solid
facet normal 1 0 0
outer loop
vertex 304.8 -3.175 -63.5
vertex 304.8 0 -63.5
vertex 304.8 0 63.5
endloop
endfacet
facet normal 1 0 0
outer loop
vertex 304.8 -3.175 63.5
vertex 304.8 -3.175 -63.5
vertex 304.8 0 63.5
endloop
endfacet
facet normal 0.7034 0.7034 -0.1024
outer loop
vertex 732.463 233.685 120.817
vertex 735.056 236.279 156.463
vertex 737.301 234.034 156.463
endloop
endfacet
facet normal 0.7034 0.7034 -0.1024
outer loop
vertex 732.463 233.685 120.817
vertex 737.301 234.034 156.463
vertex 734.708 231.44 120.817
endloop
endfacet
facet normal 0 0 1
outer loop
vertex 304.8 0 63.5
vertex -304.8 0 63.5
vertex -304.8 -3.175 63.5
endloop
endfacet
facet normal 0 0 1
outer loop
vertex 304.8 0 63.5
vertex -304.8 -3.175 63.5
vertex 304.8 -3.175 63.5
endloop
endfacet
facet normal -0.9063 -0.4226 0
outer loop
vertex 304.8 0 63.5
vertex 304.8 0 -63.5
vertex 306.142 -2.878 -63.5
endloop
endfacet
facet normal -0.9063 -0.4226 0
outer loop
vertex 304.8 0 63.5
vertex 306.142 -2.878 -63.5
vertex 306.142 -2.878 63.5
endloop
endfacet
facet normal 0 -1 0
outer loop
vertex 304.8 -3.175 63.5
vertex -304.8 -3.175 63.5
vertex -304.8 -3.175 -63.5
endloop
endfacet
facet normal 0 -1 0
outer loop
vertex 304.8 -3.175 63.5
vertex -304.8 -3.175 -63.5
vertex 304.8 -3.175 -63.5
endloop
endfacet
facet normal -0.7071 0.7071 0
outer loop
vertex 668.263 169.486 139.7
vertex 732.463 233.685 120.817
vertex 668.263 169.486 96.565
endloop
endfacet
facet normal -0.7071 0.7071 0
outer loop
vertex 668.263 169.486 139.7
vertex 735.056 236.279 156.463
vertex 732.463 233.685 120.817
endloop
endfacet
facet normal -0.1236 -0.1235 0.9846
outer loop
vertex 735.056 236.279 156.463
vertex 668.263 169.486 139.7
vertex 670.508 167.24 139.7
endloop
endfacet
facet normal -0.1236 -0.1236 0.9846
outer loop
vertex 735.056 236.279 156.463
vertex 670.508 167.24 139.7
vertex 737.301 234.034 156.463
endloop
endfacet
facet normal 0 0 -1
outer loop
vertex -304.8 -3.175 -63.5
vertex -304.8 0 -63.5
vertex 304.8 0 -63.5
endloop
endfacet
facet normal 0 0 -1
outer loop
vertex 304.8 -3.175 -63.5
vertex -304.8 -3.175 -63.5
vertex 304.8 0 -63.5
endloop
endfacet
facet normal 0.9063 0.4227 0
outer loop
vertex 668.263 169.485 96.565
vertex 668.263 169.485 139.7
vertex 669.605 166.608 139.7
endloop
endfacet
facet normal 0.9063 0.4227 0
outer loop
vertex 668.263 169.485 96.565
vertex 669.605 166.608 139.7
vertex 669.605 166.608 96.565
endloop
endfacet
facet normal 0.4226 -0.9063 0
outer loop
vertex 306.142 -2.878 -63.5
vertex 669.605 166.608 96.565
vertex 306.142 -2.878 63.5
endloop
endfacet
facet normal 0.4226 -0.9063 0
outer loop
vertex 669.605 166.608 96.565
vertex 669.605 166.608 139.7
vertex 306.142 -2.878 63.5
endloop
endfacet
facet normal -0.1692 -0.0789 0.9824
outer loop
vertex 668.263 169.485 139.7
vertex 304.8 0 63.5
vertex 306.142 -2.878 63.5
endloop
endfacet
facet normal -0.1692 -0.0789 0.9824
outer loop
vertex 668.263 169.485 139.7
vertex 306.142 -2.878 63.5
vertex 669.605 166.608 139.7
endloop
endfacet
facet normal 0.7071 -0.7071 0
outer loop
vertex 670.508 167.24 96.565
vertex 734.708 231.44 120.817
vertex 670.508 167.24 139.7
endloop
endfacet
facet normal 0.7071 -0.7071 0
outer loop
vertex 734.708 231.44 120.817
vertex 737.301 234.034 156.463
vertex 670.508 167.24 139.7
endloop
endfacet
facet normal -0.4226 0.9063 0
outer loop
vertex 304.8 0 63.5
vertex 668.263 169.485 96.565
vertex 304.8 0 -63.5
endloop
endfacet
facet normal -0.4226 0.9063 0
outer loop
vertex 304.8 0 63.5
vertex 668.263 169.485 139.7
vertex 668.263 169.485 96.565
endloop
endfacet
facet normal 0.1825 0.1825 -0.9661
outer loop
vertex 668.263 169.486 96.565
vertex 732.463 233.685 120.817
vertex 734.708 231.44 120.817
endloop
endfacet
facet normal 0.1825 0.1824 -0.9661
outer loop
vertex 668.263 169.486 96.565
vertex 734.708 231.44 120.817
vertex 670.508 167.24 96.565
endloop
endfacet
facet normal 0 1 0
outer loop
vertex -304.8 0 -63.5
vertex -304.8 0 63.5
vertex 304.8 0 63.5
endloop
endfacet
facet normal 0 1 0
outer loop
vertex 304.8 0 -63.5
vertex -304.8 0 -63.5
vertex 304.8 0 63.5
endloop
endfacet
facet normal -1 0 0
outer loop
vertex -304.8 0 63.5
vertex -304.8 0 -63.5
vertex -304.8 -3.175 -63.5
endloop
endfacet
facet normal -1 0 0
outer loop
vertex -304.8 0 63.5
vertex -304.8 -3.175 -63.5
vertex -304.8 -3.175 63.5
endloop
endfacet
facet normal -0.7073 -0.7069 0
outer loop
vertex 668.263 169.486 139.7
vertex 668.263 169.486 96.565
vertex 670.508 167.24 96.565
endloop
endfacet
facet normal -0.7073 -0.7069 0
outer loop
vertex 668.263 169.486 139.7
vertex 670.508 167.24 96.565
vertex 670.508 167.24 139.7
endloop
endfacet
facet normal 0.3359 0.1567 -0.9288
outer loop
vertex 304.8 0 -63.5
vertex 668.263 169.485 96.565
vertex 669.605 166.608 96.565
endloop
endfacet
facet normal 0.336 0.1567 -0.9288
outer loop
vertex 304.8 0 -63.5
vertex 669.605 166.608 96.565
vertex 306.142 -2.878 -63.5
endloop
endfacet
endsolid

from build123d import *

# Parameters (mm, degrees)
F0_W     = 609.6
F0_H     = 127
F1_DEPTH = 3.175
F4_DEPTH = 3.175
F7_DEPTH = 3.175


with BuildPart() as f1:
    # F0 (on Front) → F1 (new body)
    with BuildSketch(Plane.XZ):
        Rectangle(F0_W, F0_H)
    extrude(amount=F1_DEPTH)


with BuildPart() as f4:
    # F3 (on face) → F4 (new body)
    with BuildSketch(Plane(origin=(54.439168, -116.745173, 0), x_dir=(-0.906308, -0.422618, 0), z_dir=(-0.422618, 0.906308, 0))):
        Polygon((-677.279503, 96.564528), (-276.242613, -63.5), (-276.242613, 63.5), (-677.279503, 139.7), align=None)
    extrude(amount=-F4_DEPTH)


with BuildPart() as f7:
    # F6 (on face) → F7 (new body)
    with BuildSketch(Plane(origin=(249.388671, -249.388671, 0), x_dir=(-0.707107, -0.707107, 0), z_dir=(-0.707107, 0.707107, 0))):
        Polygon((-683.170028, 120.817465), (-592.377553, 96.564528), (-592.377553, 139.7), (-686.837442, 156.463262), align=None)
    extrude(amount=-F7_DEPTH)


solid = Compound([f1.part, f4.part, f7.part])
